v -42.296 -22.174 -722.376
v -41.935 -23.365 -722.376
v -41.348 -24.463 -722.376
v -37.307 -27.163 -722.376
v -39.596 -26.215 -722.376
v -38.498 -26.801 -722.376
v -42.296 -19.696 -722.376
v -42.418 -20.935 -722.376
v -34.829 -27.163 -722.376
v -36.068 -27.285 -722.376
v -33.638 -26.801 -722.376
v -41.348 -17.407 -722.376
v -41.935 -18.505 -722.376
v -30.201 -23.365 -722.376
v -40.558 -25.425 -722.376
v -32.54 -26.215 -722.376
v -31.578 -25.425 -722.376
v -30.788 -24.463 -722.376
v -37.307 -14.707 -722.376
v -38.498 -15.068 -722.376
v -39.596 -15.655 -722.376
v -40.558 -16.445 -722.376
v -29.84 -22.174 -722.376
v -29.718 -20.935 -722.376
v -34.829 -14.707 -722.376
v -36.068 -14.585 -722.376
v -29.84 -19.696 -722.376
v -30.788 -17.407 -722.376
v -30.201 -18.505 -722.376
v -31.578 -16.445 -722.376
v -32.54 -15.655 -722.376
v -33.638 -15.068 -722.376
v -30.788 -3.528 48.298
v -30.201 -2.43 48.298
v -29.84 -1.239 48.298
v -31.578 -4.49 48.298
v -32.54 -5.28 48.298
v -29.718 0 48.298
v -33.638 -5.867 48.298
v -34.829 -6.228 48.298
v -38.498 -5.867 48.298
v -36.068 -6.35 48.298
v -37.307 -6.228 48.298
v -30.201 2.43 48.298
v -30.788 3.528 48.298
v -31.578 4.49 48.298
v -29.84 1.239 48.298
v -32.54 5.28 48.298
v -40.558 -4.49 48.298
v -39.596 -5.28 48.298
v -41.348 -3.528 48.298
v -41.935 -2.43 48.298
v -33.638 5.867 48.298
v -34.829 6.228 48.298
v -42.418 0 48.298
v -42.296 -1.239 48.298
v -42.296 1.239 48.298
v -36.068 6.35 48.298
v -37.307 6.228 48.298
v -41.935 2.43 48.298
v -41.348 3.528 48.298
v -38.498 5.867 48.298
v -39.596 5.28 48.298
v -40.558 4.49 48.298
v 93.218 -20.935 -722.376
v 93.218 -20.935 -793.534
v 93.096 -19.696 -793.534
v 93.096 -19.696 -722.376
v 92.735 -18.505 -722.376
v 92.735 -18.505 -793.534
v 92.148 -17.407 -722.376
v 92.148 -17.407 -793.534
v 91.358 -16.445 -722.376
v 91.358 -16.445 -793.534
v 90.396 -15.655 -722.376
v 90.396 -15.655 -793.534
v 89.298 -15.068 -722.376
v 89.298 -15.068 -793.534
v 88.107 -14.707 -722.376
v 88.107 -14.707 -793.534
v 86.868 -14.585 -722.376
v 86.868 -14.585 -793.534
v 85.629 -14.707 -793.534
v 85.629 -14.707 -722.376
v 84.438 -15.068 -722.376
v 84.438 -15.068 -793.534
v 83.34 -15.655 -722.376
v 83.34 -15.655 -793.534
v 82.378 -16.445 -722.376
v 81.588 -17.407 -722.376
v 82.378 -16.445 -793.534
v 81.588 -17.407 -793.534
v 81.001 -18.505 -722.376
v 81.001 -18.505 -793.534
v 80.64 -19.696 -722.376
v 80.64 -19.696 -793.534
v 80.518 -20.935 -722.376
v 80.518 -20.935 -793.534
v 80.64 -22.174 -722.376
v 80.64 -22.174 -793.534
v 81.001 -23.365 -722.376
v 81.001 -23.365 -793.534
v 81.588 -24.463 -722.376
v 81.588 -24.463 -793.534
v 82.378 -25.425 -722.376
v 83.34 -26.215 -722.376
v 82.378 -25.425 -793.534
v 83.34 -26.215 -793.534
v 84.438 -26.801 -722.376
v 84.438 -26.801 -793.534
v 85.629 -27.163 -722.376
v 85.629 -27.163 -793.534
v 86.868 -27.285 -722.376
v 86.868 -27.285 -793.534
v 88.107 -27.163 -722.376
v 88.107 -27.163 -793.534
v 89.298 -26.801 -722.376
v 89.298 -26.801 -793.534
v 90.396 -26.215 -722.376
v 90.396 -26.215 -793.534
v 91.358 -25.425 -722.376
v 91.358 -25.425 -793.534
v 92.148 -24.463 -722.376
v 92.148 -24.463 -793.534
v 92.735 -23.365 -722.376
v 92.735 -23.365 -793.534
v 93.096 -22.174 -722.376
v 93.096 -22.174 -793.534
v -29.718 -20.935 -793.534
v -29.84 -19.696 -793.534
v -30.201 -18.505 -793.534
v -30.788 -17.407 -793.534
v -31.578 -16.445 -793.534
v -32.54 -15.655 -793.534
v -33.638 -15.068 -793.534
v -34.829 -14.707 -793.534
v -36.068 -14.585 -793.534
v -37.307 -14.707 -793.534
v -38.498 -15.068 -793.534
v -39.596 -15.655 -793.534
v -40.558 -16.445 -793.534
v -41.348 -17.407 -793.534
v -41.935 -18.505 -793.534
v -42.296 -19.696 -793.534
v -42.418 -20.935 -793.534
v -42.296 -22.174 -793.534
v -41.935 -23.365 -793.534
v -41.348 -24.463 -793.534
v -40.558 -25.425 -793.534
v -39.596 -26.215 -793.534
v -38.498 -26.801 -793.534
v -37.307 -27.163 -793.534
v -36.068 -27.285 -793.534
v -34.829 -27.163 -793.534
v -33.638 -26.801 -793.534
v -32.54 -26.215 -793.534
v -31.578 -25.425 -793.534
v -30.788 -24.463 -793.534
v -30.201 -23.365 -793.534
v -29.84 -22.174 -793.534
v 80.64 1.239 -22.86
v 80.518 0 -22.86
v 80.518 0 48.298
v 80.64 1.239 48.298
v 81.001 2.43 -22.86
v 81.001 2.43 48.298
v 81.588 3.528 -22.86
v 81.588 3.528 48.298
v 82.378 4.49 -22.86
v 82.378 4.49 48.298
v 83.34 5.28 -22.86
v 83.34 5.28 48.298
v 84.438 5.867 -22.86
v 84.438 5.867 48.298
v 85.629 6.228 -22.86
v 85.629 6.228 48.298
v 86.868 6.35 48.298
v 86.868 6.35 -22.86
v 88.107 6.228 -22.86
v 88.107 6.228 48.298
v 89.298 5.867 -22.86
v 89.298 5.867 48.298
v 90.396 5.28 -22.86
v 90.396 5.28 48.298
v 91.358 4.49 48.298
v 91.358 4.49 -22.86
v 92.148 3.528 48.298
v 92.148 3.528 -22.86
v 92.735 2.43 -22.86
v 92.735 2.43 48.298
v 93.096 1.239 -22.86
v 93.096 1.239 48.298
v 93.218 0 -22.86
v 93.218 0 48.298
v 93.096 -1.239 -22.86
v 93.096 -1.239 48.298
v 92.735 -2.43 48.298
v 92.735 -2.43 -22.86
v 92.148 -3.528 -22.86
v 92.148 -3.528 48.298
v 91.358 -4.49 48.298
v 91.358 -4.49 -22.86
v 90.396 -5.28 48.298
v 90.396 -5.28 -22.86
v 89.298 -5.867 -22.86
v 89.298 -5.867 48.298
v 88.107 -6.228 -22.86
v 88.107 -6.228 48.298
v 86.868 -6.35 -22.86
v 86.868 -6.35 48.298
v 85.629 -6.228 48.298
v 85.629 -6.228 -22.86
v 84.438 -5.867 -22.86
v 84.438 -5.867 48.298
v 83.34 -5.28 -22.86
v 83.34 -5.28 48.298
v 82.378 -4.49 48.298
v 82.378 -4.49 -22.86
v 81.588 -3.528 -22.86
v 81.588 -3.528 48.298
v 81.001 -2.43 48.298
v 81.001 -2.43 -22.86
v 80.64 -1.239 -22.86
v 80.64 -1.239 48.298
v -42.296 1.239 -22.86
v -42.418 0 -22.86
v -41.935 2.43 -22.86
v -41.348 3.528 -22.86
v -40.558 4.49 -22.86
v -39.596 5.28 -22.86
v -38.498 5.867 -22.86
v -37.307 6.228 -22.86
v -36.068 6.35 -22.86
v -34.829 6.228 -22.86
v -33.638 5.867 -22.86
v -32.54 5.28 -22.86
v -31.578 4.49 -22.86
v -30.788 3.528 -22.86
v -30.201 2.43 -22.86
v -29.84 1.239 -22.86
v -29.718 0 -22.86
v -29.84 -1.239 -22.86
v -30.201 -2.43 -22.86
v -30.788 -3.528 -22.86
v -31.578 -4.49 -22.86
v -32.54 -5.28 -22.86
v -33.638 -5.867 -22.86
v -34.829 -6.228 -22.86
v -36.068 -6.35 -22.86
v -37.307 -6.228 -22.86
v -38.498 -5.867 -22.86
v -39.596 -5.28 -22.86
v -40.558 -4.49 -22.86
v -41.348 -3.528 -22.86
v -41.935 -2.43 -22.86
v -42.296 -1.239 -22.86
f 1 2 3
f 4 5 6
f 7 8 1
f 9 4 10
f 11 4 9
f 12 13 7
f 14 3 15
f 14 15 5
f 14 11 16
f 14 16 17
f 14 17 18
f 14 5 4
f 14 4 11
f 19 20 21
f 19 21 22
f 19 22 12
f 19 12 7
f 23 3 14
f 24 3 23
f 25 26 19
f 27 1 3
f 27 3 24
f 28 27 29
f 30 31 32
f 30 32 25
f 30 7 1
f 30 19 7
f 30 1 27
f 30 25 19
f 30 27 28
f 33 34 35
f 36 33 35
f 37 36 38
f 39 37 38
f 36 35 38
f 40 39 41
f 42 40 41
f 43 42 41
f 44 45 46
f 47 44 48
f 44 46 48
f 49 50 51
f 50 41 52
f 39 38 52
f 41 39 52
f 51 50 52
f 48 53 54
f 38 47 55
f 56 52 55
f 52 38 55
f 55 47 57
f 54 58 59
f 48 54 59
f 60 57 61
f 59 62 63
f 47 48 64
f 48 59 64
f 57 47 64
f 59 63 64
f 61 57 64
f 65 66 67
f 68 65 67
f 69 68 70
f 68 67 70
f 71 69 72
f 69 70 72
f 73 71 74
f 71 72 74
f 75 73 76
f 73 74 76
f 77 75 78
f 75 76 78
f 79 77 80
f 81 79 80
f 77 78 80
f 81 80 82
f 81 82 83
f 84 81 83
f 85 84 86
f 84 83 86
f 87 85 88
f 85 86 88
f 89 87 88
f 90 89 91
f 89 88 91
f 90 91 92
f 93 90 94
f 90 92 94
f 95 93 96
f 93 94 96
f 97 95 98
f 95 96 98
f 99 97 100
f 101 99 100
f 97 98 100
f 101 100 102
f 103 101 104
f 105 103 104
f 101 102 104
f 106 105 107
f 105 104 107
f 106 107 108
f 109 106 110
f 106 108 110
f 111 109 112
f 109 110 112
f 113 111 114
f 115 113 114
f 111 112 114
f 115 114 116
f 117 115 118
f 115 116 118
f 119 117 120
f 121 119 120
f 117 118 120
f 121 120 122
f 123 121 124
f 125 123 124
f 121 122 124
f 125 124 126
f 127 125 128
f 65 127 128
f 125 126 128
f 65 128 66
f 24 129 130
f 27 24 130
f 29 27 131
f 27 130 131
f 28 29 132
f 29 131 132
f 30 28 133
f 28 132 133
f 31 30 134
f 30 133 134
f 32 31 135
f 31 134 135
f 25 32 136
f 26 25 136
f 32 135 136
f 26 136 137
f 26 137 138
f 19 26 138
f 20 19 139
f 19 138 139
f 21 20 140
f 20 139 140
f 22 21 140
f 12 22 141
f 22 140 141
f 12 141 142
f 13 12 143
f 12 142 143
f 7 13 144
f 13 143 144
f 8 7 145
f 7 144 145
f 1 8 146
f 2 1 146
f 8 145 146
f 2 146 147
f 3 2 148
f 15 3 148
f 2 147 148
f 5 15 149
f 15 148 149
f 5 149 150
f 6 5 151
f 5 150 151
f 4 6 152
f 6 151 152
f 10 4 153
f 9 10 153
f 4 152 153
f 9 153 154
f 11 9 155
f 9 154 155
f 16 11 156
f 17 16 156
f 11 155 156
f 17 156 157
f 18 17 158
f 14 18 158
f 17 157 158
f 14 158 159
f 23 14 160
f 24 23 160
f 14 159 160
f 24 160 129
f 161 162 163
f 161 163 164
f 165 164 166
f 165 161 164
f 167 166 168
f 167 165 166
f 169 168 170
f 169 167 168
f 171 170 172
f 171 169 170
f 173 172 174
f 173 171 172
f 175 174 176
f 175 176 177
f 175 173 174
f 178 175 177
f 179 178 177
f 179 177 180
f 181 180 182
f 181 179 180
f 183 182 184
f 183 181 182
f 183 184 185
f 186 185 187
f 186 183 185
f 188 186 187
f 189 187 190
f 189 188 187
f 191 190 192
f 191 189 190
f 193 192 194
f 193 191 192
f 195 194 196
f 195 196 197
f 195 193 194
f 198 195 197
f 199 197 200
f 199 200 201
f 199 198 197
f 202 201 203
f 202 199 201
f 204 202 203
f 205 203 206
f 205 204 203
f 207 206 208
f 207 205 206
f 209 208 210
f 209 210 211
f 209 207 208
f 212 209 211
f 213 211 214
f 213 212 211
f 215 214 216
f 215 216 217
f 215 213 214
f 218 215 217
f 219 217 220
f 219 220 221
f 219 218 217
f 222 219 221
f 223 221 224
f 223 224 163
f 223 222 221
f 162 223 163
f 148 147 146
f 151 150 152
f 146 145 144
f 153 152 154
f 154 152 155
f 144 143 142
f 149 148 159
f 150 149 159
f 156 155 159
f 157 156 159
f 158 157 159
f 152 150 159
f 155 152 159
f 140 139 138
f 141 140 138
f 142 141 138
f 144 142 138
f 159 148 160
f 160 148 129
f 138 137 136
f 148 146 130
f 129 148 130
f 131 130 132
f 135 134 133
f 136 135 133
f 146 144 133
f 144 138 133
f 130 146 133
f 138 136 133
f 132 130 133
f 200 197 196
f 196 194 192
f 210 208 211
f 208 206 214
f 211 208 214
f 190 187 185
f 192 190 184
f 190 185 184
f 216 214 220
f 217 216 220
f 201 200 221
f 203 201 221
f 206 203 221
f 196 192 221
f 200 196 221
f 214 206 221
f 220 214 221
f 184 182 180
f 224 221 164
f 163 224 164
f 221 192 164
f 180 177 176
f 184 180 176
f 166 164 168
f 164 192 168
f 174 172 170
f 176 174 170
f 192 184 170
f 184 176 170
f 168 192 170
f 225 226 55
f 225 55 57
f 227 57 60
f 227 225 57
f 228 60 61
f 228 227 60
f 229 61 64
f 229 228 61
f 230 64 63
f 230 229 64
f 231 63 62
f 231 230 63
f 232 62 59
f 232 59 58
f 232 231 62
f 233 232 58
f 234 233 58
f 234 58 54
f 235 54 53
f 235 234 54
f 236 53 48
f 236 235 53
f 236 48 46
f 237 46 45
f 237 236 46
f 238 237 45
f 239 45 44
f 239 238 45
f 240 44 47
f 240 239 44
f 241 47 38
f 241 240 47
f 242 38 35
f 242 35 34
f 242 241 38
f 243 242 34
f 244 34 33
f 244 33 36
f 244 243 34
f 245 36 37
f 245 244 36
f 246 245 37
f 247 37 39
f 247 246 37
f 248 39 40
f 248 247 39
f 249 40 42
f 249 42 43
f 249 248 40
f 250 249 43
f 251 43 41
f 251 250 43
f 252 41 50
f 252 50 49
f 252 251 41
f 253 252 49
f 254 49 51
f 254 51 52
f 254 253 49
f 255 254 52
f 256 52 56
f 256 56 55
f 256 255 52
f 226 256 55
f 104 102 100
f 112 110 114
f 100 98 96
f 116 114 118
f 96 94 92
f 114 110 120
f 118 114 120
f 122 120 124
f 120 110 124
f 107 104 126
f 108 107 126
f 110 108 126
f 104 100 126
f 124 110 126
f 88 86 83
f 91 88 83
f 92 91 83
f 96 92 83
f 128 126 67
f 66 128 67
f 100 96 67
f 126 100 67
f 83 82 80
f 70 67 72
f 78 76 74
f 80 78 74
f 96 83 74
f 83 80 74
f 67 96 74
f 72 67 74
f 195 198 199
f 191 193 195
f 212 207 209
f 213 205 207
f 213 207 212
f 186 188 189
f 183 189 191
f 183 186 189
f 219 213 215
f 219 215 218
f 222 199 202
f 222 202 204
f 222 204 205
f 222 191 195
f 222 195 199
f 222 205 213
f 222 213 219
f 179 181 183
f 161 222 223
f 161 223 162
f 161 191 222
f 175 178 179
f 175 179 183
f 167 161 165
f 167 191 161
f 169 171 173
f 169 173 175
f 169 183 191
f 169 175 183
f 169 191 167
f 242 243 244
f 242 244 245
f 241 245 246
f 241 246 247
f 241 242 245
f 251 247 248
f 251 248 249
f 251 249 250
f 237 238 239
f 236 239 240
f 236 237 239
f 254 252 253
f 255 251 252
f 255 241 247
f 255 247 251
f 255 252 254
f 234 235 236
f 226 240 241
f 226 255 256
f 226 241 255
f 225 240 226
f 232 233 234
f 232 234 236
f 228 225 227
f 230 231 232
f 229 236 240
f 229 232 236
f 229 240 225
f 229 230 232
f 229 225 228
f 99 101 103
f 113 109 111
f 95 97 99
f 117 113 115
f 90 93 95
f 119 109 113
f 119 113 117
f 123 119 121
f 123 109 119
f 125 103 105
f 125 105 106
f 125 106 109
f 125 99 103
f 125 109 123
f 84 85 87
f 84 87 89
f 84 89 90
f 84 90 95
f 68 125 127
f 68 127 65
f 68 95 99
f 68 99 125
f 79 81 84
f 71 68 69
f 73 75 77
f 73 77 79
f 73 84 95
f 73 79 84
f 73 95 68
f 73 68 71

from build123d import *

# Parameters (mm, degrees)
BOSS_EXTRUDE1_START     = -71.1581
BOSS_EXTRUDE1_OUTLINE_R = 6.35
BOSS_EXTRUDE1_DEPTH     = 71.1581
SKETCH3_R               = 6.35
BOSS_EXTRUDE2_DEPTH     = 71.1581
BOSS_EXTRUDE2_2_DEPTH   = 71.1581


# Read off the part's stored shape, not the designer's step: Boss-Extrude1
with BuildPart() as part:
    # Boss-Extrude1 outline → Boss-Extrude1 (new body)
    with BuildSketch(Plane.XY.offset(-722.376).offset(BOSS_EXTRUDE1_START)):
        with Locations((86.868, -20.93468)):
            Circle(BOSS_EXTRUDE1_OUTLINE_R)
        with Locations((-36.068, -20.93468)):
            Circle(BOSS_EXTRUDE1_OUTLINE_R)
    extrude(amount=BOSS_EXTRUDE1_DEPTH)


with BuildPart() as body_2:
    # Sketch3 → Boss-Extrude2 (new body)
    with BuildSketch(Plane(origin=(0, 0, -22.86), x_dir=(-1, 0, 0), z_dir=(0, 0, -1))):
        with Locations((36.068, 0)):
            Circle(SKETCH3_R)
    extrude(amount=-BOSS_EXTRUDE2_DEPTH)


with BuildPart() as body_3:
    # Sketch3 → Boss-Extrude2 2 (new body)
    with BuildSketch(Plane(origin=(0, 0, -22.86), x_dir=(-1, 0, 0), z_dir=(0, 0, -1))):
        with Locations((-86.868, 0)):
            Circle(SKETCH3_R)
    extrude(amount=-BOSS_EXTRUDE2_2_DEPTH)


solid = Compound([part.part, body_2.part, body_3.part])
